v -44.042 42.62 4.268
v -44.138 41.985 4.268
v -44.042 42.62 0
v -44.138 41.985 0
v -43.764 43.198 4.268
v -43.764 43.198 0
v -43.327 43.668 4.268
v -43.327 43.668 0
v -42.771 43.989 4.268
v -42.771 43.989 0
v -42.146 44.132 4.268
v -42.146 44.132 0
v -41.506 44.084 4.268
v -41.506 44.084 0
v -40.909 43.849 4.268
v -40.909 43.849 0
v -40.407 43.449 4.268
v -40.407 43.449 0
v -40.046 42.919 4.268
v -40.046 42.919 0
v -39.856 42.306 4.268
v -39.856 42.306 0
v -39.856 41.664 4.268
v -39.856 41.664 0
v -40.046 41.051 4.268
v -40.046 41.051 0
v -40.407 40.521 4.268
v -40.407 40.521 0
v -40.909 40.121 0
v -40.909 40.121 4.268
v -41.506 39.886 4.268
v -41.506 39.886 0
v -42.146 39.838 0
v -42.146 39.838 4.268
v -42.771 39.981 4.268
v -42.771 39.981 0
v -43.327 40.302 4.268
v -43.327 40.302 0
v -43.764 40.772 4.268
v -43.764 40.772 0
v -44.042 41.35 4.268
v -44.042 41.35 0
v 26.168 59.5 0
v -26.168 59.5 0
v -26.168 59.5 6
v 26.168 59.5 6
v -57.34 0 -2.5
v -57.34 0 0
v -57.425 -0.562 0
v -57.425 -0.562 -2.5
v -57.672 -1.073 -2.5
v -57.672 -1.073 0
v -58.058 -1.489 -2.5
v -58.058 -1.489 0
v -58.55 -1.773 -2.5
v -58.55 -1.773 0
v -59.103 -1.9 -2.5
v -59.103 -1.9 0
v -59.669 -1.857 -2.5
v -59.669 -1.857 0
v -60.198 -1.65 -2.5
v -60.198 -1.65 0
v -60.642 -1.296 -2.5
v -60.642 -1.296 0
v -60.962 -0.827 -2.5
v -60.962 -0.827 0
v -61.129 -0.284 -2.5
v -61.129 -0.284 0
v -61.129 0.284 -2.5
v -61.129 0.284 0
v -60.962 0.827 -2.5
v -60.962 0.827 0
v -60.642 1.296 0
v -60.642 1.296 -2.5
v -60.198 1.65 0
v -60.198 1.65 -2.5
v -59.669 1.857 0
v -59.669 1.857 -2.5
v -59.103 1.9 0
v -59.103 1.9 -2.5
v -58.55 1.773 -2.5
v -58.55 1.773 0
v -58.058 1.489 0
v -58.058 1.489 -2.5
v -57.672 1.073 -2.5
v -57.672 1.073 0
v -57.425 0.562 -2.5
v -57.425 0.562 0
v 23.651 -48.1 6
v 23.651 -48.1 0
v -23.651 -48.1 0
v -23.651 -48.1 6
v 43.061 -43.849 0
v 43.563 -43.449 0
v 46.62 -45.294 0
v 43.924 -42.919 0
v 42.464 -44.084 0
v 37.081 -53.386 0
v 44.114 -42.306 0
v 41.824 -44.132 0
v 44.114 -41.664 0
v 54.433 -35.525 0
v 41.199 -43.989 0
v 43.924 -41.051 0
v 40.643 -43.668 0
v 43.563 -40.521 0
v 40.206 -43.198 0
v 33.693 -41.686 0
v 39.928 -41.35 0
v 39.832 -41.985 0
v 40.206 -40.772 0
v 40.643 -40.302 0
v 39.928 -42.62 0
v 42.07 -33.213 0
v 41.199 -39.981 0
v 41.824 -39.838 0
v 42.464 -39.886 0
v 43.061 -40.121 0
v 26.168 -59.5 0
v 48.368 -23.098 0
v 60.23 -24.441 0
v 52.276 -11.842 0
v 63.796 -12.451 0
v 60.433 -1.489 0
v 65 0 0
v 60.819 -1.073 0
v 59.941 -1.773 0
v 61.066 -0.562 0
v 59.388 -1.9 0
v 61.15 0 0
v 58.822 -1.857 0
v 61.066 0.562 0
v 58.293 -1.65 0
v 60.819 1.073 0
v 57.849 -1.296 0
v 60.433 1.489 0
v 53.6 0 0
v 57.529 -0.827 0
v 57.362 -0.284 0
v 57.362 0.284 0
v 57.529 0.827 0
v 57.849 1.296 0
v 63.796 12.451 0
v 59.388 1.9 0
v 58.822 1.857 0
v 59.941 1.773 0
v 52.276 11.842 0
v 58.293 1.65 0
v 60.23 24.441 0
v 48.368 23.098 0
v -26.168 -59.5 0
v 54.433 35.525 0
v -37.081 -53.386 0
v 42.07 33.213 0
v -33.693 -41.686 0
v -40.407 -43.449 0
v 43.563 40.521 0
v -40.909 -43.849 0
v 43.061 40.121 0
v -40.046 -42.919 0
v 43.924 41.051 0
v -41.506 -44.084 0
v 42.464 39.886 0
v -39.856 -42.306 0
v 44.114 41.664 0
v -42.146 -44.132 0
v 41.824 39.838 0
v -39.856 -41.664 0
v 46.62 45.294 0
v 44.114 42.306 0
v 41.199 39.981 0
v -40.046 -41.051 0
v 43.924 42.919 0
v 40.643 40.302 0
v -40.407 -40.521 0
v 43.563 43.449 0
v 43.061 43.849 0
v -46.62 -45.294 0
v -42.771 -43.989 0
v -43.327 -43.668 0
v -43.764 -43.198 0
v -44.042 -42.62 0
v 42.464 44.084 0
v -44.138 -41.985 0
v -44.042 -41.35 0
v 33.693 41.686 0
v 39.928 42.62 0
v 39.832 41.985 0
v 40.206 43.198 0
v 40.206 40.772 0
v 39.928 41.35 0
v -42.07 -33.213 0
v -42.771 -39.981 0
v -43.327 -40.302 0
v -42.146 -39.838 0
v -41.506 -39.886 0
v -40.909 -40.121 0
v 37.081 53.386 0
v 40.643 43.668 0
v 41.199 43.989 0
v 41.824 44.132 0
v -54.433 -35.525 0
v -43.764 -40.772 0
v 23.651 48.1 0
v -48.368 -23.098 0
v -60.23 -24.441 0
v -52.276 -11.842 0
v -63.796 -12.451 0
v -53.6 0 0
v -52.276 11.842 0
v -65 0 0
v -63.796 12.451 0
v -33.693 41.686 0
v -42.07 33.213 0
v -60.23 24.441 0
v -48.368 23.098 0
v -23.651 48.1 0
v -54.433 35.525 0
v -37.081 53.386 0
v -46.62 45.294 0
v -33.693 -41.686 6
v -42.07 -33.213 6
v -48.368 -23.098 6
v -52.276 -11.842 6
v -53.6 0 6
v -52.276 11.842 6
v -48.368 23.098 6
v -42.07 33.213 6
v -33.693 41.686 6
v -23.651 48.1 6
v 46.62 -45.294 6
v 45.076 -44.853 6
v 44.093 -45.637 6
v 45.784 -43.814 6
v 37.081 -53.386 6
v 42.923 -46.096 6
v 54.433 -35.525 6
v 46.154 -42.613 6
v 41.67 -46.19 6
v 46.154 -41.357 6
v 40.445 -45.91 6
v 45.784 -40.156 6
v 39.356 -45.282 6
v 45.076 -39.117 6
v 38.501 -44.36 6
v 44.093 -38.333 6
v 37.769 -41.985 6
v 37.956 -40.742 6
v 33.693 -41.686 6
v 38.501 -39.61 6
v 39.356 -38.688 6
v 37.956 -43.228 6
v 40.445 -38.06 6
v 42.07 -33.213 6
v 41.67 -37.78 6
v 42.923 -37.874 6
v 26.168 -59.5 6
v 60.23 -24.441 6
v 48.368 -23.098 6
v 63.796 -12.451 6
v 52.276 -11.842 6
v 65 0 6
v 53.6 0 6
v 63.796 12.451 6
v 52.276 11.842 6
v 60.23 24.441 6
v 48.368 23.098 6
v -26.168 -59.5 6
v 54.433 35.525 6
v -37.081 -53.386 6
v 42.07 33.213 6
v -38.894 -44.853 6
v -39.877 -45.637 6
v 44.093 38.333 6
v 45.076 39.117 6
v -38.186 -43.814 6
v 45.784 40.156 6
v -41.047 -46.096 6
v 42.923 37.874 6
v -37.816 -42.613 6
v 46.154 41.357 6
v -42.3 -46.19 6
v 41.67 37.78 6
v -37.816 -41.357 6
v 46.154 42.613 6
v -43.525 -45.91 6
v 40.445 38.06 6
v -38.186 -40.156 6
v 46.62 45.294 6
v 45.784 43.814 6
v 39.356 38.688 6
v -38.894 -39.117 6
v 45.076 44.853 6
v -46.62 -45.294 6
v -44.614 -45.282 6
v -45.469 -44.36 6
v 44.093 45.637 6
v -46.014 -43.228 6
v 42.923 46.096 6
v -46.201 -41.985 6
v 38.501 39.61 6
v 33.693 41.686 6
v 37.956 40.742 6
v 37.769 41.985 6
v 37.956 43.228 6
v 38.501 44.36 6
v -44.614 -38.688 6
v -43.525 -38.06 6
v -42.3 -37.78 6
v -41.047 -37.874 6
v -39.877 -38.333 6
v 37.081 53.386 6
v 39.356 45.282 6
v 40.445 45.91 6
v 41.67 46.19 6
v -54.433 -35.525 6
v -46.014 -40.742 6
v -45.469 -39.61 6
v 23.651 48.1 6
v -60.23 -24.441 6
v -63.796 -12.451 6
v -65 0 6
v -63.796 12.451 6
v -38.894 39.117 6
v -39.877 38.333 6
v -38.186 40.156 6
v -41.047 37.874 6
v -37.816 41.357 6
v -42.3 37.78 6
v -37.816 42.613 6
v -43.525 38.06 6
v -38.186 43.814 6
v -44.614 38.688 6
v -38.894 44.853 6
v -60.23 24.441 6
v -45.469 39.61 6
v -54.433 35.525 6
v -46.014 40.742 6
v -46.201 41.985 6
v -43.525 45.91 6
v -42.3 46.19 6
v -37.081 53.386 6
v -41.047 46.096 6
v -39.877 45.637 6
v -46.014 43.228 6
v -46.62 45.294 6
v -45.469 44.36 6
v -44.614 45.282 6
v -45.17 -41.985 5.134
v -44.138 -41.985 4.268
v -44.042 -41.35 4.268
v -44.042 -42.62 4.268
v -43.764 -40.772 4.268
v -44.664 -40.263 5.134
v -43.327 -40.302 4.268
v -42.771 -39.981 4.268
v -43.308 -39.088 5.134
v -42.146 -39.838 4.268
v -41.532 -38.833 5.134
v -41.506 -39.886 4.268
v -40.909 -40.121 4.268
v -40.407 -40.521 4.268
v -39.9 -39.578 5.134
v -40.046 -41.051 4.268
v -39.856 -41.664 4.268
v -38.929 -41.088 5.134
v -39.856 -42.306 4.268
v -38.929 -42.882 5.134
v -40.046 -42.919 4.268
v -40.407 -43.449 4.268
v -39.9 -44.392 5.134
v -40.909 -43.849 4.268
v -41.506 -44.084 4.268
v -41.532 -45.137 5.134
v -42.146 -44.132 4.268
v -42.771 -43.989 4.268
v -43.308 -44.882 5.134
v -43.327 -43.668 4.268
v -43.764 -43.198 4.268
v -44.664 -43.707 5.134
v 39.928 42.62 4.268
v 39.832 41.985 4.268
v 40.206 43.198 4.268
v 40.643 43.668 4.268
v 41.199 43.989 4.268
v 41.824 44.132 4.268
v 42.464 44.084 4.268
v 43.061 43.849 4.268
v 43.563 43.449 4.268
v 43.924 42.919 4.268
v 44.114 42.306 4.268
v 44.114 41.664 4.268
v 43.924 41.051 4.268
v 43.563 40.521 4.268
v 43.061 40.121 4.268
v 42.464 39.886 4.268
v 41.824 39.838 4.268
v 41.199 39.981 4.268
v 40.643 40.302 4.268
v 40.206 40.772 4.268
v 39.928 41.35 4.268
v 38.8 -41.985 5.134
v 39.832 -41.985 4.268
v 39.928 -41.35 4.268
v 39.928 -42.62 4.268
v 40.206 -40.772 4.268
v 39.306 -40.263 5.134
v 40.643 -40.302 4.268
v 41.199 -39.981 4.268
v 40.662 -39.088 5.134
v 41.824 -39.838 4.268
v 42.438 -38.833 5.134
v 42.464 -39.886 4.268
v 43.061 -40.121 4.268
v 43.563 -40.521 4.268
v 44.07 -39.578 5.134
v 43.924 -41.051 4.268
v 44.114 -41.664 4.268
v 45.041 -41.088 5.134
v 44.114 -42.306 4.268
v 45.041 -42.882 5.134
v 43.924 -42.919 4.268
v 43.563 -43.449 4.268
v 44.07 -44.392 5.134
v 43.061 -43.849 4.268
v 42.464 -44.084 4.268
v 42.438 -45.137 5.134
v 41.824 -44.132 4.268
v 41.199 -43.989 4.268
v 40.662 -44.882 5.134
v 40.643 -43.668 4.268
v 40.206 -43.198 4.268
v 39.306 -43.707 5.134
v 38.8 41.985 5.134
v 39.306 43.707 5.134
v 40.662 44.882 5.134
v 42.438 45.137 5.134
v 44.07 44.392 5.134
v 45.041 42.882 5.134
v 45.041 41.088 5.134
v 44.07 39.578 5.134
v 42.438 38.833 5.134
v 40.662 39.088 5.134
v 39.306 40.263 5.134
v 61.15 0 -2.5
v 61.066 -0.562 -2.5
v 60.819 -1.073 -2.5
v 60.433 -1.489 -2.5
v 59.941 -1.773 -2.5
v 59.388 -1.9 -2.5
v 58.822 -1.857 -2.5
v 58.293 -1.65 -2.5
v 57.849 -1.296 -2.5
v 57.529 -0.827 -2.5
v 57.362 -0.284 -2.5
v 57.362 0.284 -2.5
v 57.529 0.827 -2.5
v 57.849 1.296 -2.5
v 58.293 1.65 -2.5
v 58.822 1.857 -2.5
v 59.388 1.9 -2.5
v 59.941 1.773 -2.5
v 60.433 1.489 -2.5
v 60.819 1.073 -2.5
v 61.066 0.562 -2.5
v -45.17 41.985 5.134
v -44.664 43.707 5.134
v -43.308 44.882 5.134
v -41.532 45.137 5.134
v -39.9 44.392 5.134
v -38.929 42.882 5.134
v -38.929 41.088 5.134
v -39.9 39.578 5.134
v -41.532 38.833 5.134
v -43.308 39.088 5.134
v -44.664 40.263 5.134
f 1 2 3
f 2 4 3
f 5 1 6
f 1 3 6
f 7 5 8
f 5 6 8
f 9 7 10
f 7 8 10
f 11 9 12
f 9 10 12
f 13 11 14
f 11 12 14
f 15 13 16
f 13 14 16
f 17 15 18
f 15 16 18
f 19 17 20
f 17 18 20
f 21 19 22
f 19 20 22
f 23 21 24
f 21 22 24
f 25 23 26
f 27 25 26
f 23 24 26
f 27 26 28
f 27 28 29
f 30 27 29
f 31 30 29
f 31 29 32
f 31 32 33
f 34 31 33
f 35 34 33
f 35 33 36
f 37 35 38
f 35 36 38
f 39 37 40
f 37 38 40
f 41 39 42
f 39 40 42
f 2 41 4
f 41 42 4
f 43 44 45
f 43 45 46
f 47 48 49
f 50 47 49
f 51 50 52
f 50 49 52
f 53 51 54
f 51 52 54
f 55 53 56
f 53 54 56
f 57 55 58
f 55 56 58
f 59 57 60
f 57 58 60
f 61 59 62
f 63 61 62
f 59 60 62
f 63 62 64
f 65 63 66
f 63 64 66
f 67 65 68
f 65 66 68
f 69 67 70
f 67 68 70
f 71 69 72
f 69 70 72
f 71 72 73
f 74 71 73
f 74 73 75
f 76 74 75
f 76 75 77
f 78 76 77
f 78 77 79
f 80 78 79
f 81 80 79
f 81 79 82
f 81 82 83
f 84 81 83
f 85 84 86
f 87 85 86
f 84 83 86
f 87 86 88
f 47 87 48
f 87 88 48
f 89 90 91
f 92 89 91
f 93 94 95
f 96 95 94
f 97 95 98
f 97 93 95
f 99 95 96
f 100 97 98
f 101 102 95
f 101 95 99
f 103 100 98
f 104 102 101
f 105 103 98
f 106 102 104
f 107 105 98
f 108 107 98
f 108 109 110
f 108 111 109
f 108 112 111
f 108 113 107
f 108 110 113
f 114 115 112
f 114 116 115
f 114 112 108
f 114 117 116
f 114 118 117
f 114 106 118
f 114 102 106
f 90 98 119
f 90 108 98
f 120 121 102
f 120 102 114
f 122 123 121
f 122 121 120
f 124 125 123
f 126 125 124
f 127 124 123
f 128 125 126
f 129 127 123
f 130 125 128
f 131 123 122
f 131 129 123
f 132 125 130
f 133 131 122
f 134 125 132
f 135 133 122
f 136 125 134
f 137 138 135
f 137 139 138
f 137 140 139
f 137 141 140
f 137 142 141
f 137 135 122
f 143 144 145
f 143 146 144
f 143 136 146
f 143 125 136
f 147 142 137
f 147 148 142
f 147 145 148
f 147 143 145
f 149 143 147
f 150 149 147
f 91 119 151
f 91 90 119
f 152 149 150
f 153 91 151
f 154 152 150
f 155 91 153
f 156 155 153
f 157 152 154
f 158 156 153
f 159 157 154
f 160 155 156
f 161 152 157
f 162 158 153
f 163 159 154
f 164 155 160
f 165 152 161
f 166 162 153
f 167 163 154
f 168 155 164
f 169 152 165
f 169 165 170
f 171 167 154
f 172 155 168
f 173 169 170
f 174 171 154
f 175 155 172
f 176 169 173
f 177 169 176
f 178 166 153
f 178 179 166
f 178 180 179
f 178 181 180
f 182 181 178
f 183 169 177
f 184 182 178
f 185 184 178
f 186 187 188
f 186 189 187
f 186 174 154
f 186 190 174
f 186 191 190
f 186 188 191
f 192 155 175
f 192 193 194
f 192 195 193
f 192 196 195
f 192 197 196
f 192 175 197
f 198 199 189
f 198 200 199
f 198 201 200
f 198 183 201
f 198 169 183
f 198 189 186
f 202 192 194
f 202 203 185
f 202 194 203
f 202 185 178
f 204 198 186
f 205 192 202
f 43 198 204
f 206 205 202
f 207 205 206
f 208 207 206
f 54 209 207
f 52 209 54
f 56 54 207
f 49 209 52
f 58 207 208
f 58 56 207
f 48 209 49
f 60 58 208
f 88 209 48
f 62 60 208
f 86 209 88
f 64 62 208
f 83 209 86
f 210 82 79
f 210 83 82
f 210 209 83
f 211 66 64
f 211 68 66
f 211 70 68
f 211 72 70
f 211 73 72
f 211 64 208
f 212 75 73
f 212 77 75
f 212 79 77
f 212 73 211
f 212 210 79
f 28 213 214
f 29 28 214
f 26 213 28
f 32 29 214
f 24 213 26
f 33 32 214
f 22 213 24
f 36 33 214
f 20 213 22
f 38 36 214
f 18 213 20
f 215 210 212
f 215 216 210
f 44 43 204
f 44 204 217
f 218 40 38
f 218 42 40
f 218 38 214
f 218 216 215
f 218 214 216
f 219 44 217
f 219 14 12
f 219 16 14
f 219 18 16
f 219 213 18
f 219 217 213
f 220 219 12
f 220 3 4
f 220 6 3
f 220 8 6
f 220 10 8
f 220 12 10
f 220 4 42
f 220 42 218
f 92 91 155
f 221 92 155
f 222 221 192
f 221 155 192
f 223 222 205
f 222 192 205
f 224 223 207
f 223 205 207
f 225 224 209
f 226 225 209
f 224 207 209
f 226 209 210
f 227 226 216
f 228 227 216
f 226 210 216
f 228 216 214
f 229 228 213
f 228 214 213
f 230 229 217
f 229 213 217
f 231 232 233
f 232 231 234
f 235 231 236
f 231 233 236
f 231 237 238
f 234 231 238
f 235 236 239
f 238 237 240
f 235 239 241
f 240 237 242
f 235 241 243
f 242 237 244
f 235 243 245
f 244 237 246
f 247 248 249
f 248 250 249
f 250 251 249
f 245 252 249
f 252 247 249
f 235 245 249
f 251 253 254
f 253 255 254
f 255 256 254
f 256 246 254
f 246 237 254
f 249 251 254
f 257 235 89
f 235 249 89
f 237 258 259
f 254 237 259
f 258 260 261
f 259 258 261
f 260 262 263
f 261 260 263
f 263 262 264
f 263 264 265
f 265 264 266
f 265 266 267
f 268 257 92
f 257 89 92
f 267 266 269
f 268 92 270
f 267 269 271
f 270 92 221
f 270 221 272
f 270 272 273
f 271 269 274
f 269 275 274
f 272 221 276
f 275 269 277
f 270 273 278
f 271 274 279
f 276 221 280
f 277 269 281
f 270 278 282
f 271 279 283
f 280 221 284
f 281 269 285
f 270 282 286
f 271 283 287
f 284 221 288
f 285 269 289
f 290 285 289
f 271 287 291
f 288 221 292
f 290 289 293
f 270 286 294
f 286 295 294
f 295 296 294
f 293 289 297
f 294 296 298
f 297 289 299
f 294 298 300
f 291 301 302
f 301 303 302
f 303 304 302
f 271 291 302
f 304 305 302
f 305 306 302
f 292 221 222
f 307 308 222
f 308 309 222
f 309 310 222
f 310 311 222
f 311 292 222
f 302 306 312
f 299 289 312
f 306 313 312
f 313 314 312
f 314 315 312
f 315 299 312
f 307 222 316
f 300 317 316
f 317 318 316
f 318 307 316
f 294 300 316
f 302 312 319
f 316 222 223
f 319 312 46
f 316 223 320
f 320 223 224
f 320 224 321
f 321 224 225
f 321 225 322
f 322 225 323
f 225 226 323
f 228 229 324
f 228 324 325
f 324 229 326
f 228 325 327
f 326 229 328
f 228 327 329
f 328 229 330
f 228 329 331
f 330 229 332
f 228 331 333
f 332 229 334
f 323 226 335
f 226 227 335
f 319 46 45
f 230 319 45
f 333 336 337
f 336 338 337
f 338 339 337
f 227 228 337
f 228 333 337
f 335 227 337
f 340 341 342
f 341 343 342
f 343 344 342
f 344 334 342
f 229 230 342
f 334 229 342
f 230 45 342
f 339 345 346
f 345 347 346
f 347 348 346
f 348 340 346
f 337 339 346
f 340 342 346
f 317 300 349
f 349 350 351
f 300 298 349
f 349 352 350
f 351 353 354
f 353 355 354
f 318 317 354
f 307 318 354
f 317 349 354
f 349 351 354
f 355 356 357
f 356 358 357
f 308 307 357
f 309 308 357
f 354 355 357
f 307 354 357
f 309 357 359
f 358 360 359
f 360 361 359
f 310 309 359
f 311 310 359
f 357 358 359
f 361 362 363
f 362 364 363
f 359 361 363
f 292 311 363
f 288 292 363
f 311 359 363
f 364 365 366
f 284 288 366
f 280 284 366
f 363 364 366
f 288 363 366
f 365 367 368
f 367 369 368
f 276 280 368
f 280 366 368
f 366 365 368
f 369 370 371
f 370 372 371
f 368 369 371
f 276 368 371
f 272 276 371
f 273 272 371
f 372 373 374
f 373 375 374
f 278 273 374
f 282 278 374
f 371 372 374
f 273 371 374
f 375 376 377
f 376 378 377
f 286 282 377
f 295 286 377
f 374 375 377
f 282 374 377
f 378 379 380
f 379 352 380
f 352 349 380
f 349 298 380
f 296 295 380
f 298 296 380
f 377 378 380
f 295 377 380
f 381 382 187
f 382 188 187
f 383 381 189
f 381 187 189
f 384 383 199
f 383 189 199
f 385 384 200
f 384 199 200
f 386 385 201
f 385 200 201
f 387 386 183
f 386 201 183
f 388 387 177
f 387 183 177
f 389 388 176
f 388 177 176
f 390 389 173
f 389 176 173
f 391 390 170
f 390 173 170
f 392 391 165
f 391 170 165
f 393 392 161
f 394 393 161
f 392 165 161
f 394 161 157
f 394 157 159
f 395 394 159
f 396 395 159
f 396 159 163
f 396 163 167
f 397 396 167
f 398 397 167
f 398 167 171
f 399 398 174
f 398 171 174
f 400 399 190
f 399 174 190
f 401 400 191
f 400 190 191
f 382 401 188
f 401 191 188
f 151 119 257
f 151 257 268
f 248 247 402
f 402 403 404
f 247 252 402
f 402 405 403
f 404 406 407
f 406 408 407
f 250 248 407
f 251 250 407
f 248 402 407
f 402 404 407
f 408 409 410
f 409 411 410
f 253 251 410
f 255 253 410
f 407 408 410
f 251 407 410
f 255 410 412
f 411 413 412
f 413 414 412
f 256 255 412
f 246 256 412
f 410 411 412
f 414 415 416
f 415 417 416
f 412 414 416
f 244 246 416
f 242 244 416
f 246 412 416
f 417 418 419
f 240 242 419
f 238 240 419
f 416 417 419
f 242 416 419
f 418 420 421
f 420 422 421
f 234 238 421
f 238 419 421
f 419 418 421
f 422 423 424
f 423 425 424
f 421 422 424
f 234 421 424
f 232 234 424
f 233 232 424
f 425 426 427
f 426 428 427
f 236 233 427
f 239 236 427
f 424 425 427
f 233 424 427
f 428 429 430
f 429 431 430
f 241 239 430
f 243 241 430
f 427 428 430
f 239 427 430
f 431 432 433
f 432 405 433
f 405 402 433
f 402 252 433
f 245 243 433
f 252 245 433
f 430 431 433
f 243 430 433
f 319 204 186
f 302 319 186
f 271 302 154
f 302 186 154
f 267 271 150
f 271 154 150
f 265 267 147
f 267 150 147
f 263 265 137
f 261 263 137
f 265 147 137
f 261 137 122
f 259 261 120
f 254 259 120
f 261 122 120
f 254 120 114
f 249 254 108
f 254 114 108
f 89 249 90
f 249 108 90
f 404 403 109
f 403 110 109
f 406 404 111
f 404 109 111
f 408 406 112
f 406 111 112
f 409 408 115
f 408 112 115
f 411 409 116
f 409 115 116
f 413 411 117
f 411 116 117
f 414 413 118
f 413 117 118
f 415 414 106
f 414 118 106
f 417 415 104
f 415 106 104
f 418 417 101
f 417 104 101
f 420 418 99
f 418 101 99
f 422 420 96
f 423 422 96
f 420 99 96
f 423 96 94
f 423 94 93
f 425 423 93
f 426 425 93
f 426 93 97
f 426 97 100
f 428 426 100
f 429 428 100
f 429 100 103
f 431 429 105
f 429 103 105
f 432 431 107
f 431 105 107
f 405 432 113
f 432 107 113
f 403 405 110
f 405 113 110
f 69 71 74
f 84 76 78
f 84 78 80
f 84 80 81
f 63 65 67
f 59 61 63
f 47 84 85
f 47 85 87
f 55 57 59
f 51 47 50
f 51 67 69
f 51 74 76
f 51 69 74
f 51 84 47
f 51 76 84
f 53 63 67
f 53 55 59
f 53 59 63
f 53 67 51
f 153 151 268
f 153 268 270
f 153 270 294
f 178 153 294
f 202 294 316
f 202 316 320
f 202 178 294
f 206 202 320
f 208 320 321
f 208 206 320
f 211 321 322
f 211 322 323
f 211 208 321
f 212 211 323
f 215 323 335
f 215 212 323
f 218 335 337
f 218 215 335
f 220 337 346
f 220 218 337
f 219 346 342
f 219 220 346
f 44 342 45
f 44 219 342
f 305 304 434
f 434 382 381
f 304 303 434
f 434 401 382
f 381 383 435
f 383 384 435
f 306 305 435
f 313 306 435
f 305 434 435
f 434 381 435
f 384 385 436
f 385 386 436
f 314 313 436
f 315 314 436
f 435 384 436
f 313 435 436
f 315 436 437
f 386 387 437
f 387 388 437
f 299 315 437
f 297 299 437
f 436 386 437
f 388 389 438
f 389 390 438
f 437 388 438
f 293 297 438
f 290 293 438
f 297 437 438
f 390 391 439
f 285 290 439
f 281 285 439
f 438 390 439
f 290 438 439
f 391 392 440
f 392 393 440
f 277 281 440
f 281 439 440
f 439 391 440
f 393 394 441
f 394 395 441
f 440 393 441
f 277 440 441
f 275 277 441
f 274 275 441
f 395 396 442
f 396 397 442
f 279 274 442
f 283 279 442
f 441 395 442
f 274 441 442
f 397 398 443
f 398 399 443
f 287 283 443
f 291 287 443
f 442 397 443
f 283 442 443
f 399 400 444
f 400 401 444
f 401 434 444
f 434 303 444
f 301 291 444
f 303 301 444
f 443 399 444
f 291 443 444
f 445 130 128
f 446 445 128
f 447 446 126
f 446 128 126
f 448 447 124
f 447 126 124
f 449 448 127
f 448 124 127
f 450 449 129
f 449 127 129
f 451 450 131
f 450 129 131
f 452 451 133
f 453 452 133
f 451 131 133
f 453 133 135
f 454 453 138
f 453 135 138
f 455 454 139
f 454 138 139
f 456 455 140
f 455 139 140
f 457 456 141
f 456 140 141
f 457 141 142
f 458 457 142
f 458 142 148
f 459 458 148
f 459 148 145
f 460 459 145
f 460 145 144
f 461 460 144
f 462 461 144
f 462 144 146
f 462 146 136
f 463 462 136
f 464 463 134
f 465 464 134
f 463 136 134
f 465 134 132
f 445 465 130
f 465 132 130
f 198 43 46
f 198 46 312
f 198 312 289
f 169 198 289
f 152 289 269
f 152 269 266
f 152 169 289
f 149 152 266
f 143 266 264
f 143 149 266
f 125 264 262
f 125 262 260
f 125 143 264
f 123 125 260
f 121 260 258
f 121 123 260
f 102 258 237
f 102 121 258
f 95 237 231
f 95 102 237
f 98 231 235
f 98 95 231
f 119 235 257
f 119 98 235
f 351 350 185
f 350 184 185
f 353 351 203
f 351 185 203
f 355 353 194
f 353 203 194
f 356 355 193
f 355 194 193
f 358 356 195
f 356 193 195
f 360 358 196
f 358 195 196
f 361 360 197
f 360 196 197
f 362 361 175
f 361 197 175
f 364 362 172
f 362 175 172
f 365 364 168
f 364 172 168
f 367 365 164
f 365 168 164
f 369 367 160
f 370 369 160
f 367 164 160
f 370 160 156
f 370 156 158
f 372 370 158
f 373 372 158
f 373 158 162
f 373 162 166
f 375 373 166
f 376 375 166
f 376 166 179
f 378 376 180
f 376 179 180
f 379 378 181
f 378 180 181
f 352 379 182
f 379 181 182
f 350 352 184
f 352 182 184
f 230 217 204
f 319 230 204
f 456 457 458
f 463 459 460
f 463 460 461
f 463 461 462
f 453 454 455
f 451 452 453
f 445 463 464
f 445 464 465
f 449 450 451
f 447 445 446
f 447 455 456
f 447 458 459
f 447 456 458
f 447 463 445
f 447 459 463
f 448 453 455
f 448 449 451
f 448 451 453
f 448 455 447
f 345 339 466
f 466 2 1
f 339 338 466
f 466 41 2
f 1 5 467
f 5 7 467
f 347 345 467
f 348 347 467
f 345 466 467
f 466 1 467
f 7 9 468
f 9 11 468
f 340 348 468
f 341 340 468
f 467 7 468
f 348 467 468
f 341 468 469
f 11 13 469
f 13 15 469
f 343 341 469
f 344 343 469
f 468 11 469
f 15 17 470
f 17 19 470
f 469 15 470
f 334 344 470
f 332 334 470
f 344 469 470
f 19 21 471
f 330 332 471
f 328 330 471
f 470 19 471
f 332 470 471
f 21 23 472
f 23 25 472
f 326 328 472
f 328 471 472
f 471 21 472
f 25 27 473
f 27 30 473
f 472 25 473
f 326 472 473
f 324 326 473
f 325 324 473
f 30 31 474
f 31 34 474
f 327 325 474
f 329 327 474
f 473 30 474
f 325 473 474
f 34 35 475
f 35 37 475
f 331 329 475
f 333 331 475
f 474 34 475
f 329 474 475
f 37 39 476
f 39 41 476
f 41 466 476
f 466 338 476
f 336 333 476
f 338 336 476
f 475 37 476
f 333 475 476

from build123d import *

# Parameters (mm, degrees)
BOSS_EXTRUDE1_DEPTH                               = 6
CSK_FOR_8_FLAT_HEAD_MACHINE_SCREW_100_D           = 4.3053
CSK_FOR_8_FLAT_HEAD_MACHINE_SCREW_100_CSINK_D     = 8.4328
CSK_FOR_8_FLAT_HEAD_MACHINE_SCREW_100_CSINK_ANGLE = 100
SKETCH5_R                                         = 1.905
BOSS_EXTRUDE2_DEPTH                               = 2.5


with BuildPart() as part:
    # Sketch1 → Boss-Extrude1 (new body)
    with BuildSketch(Plane.XY):
        with BuildLine():
            Line((-26.167728216, 59.5), (26.167728216, 59.5))
            ThreePointArc((26.167728216, 59.5), (65, 0), (26.167728216, -59.5))
            Line((26.167728216, -59.5), (-26.167728216, -59.5))
            ThreePointArc((-26.167728216, -59.5), (-65, 0), (-26.167728216, 59.5))
        make_face()
        with BuildLine():
            Line((-23.650581388, 48.1), (23.650581388, 48.1))
            ThreePointArc((23.650581388, 48.1), (53.6, 0), (23.650581388, -48.1))
            Line((23.650581388, -48.1), (-23.650581388, -48.1))
            ThreePointArc((-23.650581388, -48.1), (-53.6, 0), (-23.650581388, 48.1))
        make_face(mode=Mode.SUBTRACT)
    extrude(amount=BOSS_EXTRUDE1_DEPTH)

    # CSK for #8 Flat Head Machine Screw (100)1 (through all)
    with Locations(Plane.XY.offset(6)):
        with Locations((0, 0), (41.985, 41.985), (-41.985, -41.985), (-41.985, 41.985), (41.985, -41.985)):
            CounterSinkHole(CSK_FOR_8_FLAT_HEAD_MACHINE_SCREW_100_D / 2, CSK_FOR_8_FLAT_HEAD_MACHINE_SCREW_100_CSINK_D / 2, counter_sink_angle=CSK_FOR_8_FLAT_HEAD_MACHINE_SCREW_100_CSINK_ANGLE)

    # Sketch5 → Boss-Extrude2 (add)
    with BuildSketch(Plane(origin=(0, 0, 0), x_dir=(-1, 0, 0), z_dir=(0, 0, -1))):
        with Locations(Location((-59.2455, 0, 0), (0, 0, 180))):
            Circle(SKETCH5_R)
        with Locations(Location((59.2455, 0, 0), (0, 0, 180))):
            Circle(SKETCH5_R)
    extrude(amount=BOSS_EXTRUDE2_DEPTH)


solid = part.part
